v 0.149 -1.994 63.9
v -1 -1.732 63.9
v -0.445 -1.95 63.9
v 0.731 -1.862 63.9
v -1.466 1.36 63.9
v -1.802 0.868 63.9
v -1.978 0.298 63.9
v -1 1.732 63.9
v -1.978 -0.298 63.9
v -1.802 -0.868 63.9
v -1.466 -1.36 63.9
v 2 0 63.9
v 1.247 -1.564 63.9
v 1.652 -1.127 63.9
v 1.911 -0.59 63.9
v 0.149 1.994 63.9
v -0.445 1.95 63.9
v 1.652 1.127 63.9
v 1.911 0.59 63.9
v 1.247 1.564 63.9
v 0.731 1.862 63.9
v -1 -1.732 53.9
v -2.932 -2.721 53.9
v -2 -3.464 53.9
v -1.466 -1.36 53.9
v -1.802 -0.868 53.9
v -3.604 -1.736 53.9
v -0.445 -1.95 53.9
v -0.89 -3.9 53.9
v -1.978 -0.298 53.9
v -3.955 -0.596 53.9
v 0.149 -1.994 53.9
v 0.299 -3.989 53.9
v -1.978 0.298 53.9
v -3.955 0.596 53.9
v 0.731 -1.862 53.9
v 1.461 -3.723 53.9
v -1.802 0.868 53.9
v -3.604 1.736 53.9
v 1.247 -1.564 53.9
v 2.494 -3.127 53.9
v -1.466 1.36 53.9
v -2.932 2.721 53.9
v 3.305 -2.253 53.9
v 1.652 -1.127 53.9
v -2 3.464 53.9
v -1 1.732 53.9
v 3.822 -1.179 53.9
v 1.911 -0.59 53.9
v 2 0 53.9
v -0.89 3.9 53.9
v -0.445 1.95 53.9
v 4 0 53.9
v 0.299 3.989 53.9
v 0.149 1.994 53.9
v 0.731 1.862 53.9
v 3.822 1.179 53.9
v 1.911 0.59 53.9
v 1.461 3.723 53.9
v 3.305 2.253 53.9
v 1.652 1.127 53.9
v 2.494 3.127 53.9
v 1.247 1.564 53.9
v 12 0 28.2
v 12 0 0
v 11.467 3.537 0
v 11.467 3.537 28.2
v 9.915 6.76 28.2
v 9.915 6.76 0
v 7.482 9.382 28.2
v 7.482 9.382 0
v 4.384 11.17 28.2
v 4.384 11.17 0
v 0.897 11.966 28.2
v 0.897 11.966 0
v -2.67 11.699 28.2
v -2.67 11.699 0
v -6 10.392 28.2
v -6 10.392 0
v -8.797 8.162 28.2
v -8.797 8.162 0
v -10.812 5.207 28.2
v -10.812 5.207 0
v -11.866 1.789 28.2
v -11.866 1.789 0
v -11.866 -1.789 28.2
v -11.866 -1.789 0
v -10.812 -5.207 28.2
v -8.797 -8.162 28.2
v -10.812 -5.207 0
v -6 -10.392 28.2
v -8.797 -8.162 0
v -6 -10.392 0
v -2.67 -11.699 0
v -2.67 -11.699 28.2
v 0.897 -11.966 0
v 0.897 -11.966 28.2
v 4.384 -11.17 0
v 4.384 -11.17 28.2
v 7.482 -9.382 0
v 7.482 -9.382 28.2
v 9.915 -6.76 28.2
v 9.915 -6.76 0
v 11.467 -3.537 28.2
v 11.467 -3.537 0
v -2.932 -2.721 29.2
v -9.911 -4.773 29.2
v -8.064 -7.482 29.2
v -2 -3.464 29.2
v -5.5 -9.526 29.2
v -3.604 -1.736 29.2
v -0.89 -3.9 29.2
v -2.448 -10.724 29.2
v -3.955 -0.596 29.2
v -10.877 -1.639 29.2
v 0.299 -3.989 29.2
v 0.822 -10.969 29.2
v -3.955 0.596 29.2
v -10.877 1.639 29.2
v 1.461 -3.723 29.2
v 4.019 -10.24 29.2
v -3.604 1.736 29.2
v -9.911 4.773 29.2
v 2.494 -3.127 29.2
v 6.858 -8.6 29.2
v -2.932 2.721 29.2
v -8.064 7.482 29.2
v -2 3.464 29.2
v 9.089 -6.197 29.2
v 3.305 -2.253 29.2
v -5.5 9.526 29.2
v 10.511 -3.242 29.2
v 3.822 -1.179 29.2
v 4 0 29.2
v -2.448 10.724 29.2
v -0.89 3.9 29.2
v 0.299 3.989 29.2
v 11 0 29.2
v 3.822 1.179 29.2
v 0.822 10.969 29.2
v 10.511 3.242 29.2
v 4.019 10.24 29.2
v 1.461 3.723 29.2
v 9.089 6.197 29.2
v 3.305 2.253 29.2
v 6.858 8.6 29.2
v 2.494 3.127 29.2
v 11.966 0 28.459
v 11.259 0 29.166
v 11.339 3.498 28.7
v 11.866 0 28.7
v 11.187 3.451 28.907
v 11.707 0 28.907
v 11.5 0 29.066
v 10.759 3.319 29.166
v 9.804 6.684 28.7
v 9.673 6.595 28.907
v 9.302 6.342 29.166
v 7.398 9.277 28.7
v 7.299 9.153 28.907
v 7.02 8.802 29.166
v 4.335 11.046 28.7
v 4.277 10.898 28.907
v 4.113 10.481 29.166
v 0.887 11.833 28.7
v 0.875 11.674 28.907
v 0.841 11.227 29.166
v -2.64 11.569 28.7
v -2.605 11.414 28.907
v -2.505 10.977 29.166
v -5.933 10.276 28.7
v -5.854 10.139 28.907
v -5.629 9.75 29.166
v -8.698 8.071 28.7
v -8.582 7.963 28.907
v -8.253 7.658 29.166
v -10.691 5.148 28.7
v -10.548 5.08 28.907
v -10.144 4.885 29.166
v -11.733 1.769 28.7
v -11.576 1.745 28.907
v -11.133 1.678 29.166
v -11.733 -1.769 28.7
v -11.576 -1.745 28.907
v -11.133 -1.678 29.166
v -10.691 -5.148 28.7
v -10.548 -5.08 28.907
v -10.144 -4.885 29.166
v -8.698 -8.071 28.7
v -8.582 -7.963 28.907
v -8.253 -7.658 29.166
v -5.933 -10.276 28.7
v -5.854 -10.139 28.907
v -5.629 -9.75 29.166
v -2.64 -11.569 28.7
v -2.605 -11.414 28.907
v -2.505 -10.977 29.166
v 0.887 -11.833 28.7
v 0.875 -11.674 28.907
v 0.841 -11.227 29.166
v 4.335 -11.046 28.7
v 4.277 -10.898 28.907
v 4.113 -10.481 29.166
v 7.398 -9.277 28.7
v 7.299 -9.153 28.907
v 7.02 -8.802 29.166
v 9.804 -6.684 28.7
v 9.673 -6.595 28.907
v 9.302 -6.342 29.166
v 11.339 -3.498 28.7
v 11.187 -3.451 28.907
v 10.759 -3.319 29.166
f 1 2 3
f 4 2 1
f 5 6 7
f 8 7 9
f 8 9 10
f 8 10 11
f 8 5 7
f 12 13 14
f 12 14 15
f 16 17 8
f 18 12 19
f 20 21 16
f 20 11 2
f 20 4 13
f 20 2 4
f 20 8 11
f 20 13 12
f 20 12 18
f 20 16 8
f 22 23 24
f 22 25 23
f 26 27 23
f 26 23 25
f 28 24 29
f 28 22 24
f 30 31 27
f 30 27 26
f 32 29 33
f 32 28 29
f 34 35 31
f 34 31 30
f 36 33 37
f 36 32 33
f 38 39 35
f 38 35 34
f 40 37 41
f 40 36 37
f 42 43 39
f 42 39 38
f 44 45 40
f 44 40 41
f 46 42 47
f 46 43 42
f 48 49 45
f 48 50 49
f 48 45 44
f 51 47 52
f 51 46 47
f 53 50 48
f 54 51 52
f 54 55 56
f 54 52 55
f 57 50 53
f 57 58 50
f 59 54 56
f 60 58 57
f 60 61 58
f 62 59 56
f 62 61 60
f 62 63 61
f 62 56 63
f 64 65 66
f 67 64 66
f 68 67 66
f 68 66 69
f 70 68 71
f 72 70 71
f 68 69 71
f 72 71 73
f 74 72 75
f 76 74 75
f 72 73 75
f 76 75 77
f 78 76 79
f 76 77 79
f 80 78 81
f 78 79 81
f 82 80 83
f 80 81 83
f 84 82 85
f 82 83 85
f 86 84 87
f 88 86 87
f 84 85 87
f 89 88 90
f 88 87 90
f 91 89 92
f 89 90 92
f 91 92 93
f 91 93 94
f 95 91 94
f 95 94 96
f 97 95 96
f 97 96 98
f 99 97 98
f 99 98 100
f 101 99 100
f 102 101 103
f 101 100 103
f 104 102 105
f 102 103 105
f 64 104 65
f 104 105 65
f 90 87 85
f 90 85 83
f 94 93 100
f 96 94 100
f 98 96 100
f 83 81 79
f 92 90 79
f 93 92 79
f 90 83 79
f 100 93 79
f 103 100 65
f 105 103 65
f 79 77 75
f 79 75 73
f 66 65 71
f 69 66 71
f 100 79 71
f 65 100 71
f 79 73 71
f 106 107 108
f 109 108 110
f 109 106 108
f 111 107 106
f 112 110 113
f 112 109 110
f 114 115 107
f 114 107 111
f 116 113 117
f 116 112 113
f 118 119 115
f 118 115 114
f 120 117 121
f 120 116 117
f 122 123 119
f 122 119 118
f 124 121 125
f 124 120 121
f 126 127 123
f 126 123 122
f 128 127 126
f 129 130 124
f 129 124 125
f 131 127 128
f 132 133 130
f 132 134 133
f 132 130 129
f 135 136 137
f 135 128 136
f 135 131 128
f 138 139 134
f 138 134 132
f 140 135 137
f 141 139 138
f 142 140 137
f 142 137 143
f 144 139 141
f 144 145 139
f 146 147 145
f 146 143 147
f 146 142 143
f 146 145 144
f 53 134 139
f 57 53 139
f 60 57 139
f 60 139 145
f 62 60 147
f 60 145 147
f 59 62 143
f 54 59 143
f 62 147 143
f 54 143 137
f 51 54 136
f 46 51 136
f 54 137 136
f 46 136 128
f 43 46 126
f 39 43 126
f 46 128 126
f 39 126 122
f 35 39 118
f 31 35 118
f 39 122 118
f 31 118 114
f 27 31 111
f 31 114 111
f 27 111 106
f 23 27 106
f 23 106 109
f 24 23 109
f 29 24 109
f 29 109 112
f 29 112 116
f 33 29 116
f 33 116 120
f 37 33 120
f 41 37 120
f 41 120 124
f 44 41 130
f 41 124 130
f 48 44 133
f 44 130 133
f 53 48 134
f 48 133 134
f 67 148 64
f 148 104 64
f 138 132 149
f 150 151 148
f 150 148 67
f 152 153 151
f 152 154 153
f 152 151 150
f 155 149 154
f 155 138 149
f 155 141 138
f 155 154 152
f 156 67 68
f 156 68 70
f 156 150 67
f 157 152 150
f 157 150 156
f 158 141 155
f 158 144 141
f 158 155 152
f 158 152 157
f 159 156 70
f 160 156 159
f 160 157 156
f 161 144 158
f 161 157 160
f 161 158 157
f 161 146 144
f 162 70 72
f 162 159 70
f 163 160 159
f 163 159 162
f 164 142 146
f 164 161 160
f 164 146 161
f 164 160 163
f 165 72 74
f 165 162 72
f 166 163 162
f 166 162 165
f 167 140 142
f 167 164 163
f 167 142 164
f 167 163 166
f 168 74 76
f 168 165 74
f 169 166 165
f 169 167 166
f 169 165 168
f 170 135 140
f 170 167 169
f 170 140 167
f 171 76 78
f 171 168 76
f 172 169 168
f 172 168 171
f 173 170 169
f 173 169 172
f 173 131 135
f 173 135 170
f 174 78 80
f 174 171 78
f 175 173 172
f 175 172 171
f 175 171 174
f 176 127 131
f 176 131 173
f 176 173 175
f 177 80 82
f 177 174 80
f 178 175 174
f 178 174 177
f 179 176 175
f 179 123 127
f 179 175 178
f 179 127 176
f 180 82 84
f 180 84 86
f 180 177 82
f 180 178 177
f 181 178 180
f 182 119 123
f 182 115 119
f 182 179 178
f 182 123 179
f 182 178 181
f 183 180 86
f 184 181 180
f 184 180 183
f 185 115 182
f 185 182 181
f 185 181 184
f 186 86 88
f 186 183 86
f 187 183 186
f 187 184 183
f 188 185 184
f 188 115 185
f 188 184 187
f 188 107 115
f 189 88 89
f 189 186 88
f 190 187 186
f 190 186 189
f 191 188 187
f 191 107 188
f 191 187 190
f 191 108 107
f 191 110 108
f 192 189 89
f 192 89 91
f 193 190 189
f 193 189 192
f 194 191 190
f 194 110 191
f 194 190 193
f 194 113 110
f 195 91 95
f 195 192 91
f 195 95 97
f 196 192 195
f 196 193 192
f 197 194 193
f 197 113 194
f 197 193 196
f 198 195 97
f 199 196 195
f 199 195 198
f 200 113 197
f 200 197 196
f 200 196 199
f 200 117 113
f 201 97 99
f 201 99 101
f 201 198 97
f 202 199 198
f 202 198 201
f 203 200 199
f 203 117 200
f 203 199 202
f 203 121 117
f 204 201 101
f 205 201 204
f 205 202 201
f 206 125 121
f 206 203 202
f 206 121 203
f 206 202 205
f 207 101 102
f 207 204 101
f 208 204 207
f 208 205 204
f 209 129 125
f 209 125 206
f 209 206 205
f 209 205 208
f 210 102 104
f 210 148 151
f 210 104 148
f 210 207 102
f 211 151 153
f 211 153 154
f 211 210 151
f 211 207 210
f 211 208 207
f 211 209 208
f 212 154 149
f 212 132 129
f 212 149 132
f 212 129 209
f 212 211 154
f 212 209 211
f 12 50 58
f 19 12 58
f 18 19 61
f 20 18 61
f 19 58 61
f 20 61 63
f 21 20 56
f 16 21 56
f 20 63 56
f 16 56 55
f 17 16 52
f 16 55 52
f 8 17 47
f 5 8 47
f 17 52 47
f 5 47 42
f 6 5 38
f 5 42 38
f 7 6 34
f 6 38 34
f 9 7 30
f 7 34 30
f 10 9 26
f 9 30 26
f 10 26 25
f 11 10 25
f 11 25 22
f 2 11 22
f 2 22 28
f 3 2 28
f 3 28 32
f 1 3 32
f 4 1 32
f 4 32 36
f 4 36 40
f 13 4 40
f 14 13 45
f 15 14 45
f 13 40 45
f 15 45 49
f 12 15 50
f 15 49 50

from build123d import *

# Parameters (mm, degrees)
ESQUISSE1_R      = 12
EXTRUSION1_DEPTH = 29.2
CONG_1_R         = 1
ESQUISSE2_R      = 4
EXTRUSION2_DEPTH = 24.7
ESQUISSE3_R      = 2
EXTRUSION3_DEPTH = 10


with BuildPart() as part:
    # Esquisse1 → Extrusion1 (new body)
    with BuildSketch(Plane.XY):
        Circle(ESQUISSE1_R)
    extrude(amount=EXTRUSION1_DEPTH)

    # Congé1
    cong_1_edges = [part.edges().sort_by_distance(p)[0] for p in [
        (-12, 0, 29.2),
    ]]
    fillet(cong_1_edges, radius=CONG_1_R)

    # Esquisse2 → Extrusion2 (add)
    with BuildSketch(Plane.XY.offset(29.2)):
        Circle(ESQUISSE2_R)
    extrude(amount=EXTRUSION2_DEPTH)

    # Esquisse3 → Extrusion3 (add)
    with BuildSketch(Plane.XY.offset(53.9)):
        Circle(ESQUISSE3_R)
    extrude(amount=EXTRUSION3_DEPTH)


solid = part.part
